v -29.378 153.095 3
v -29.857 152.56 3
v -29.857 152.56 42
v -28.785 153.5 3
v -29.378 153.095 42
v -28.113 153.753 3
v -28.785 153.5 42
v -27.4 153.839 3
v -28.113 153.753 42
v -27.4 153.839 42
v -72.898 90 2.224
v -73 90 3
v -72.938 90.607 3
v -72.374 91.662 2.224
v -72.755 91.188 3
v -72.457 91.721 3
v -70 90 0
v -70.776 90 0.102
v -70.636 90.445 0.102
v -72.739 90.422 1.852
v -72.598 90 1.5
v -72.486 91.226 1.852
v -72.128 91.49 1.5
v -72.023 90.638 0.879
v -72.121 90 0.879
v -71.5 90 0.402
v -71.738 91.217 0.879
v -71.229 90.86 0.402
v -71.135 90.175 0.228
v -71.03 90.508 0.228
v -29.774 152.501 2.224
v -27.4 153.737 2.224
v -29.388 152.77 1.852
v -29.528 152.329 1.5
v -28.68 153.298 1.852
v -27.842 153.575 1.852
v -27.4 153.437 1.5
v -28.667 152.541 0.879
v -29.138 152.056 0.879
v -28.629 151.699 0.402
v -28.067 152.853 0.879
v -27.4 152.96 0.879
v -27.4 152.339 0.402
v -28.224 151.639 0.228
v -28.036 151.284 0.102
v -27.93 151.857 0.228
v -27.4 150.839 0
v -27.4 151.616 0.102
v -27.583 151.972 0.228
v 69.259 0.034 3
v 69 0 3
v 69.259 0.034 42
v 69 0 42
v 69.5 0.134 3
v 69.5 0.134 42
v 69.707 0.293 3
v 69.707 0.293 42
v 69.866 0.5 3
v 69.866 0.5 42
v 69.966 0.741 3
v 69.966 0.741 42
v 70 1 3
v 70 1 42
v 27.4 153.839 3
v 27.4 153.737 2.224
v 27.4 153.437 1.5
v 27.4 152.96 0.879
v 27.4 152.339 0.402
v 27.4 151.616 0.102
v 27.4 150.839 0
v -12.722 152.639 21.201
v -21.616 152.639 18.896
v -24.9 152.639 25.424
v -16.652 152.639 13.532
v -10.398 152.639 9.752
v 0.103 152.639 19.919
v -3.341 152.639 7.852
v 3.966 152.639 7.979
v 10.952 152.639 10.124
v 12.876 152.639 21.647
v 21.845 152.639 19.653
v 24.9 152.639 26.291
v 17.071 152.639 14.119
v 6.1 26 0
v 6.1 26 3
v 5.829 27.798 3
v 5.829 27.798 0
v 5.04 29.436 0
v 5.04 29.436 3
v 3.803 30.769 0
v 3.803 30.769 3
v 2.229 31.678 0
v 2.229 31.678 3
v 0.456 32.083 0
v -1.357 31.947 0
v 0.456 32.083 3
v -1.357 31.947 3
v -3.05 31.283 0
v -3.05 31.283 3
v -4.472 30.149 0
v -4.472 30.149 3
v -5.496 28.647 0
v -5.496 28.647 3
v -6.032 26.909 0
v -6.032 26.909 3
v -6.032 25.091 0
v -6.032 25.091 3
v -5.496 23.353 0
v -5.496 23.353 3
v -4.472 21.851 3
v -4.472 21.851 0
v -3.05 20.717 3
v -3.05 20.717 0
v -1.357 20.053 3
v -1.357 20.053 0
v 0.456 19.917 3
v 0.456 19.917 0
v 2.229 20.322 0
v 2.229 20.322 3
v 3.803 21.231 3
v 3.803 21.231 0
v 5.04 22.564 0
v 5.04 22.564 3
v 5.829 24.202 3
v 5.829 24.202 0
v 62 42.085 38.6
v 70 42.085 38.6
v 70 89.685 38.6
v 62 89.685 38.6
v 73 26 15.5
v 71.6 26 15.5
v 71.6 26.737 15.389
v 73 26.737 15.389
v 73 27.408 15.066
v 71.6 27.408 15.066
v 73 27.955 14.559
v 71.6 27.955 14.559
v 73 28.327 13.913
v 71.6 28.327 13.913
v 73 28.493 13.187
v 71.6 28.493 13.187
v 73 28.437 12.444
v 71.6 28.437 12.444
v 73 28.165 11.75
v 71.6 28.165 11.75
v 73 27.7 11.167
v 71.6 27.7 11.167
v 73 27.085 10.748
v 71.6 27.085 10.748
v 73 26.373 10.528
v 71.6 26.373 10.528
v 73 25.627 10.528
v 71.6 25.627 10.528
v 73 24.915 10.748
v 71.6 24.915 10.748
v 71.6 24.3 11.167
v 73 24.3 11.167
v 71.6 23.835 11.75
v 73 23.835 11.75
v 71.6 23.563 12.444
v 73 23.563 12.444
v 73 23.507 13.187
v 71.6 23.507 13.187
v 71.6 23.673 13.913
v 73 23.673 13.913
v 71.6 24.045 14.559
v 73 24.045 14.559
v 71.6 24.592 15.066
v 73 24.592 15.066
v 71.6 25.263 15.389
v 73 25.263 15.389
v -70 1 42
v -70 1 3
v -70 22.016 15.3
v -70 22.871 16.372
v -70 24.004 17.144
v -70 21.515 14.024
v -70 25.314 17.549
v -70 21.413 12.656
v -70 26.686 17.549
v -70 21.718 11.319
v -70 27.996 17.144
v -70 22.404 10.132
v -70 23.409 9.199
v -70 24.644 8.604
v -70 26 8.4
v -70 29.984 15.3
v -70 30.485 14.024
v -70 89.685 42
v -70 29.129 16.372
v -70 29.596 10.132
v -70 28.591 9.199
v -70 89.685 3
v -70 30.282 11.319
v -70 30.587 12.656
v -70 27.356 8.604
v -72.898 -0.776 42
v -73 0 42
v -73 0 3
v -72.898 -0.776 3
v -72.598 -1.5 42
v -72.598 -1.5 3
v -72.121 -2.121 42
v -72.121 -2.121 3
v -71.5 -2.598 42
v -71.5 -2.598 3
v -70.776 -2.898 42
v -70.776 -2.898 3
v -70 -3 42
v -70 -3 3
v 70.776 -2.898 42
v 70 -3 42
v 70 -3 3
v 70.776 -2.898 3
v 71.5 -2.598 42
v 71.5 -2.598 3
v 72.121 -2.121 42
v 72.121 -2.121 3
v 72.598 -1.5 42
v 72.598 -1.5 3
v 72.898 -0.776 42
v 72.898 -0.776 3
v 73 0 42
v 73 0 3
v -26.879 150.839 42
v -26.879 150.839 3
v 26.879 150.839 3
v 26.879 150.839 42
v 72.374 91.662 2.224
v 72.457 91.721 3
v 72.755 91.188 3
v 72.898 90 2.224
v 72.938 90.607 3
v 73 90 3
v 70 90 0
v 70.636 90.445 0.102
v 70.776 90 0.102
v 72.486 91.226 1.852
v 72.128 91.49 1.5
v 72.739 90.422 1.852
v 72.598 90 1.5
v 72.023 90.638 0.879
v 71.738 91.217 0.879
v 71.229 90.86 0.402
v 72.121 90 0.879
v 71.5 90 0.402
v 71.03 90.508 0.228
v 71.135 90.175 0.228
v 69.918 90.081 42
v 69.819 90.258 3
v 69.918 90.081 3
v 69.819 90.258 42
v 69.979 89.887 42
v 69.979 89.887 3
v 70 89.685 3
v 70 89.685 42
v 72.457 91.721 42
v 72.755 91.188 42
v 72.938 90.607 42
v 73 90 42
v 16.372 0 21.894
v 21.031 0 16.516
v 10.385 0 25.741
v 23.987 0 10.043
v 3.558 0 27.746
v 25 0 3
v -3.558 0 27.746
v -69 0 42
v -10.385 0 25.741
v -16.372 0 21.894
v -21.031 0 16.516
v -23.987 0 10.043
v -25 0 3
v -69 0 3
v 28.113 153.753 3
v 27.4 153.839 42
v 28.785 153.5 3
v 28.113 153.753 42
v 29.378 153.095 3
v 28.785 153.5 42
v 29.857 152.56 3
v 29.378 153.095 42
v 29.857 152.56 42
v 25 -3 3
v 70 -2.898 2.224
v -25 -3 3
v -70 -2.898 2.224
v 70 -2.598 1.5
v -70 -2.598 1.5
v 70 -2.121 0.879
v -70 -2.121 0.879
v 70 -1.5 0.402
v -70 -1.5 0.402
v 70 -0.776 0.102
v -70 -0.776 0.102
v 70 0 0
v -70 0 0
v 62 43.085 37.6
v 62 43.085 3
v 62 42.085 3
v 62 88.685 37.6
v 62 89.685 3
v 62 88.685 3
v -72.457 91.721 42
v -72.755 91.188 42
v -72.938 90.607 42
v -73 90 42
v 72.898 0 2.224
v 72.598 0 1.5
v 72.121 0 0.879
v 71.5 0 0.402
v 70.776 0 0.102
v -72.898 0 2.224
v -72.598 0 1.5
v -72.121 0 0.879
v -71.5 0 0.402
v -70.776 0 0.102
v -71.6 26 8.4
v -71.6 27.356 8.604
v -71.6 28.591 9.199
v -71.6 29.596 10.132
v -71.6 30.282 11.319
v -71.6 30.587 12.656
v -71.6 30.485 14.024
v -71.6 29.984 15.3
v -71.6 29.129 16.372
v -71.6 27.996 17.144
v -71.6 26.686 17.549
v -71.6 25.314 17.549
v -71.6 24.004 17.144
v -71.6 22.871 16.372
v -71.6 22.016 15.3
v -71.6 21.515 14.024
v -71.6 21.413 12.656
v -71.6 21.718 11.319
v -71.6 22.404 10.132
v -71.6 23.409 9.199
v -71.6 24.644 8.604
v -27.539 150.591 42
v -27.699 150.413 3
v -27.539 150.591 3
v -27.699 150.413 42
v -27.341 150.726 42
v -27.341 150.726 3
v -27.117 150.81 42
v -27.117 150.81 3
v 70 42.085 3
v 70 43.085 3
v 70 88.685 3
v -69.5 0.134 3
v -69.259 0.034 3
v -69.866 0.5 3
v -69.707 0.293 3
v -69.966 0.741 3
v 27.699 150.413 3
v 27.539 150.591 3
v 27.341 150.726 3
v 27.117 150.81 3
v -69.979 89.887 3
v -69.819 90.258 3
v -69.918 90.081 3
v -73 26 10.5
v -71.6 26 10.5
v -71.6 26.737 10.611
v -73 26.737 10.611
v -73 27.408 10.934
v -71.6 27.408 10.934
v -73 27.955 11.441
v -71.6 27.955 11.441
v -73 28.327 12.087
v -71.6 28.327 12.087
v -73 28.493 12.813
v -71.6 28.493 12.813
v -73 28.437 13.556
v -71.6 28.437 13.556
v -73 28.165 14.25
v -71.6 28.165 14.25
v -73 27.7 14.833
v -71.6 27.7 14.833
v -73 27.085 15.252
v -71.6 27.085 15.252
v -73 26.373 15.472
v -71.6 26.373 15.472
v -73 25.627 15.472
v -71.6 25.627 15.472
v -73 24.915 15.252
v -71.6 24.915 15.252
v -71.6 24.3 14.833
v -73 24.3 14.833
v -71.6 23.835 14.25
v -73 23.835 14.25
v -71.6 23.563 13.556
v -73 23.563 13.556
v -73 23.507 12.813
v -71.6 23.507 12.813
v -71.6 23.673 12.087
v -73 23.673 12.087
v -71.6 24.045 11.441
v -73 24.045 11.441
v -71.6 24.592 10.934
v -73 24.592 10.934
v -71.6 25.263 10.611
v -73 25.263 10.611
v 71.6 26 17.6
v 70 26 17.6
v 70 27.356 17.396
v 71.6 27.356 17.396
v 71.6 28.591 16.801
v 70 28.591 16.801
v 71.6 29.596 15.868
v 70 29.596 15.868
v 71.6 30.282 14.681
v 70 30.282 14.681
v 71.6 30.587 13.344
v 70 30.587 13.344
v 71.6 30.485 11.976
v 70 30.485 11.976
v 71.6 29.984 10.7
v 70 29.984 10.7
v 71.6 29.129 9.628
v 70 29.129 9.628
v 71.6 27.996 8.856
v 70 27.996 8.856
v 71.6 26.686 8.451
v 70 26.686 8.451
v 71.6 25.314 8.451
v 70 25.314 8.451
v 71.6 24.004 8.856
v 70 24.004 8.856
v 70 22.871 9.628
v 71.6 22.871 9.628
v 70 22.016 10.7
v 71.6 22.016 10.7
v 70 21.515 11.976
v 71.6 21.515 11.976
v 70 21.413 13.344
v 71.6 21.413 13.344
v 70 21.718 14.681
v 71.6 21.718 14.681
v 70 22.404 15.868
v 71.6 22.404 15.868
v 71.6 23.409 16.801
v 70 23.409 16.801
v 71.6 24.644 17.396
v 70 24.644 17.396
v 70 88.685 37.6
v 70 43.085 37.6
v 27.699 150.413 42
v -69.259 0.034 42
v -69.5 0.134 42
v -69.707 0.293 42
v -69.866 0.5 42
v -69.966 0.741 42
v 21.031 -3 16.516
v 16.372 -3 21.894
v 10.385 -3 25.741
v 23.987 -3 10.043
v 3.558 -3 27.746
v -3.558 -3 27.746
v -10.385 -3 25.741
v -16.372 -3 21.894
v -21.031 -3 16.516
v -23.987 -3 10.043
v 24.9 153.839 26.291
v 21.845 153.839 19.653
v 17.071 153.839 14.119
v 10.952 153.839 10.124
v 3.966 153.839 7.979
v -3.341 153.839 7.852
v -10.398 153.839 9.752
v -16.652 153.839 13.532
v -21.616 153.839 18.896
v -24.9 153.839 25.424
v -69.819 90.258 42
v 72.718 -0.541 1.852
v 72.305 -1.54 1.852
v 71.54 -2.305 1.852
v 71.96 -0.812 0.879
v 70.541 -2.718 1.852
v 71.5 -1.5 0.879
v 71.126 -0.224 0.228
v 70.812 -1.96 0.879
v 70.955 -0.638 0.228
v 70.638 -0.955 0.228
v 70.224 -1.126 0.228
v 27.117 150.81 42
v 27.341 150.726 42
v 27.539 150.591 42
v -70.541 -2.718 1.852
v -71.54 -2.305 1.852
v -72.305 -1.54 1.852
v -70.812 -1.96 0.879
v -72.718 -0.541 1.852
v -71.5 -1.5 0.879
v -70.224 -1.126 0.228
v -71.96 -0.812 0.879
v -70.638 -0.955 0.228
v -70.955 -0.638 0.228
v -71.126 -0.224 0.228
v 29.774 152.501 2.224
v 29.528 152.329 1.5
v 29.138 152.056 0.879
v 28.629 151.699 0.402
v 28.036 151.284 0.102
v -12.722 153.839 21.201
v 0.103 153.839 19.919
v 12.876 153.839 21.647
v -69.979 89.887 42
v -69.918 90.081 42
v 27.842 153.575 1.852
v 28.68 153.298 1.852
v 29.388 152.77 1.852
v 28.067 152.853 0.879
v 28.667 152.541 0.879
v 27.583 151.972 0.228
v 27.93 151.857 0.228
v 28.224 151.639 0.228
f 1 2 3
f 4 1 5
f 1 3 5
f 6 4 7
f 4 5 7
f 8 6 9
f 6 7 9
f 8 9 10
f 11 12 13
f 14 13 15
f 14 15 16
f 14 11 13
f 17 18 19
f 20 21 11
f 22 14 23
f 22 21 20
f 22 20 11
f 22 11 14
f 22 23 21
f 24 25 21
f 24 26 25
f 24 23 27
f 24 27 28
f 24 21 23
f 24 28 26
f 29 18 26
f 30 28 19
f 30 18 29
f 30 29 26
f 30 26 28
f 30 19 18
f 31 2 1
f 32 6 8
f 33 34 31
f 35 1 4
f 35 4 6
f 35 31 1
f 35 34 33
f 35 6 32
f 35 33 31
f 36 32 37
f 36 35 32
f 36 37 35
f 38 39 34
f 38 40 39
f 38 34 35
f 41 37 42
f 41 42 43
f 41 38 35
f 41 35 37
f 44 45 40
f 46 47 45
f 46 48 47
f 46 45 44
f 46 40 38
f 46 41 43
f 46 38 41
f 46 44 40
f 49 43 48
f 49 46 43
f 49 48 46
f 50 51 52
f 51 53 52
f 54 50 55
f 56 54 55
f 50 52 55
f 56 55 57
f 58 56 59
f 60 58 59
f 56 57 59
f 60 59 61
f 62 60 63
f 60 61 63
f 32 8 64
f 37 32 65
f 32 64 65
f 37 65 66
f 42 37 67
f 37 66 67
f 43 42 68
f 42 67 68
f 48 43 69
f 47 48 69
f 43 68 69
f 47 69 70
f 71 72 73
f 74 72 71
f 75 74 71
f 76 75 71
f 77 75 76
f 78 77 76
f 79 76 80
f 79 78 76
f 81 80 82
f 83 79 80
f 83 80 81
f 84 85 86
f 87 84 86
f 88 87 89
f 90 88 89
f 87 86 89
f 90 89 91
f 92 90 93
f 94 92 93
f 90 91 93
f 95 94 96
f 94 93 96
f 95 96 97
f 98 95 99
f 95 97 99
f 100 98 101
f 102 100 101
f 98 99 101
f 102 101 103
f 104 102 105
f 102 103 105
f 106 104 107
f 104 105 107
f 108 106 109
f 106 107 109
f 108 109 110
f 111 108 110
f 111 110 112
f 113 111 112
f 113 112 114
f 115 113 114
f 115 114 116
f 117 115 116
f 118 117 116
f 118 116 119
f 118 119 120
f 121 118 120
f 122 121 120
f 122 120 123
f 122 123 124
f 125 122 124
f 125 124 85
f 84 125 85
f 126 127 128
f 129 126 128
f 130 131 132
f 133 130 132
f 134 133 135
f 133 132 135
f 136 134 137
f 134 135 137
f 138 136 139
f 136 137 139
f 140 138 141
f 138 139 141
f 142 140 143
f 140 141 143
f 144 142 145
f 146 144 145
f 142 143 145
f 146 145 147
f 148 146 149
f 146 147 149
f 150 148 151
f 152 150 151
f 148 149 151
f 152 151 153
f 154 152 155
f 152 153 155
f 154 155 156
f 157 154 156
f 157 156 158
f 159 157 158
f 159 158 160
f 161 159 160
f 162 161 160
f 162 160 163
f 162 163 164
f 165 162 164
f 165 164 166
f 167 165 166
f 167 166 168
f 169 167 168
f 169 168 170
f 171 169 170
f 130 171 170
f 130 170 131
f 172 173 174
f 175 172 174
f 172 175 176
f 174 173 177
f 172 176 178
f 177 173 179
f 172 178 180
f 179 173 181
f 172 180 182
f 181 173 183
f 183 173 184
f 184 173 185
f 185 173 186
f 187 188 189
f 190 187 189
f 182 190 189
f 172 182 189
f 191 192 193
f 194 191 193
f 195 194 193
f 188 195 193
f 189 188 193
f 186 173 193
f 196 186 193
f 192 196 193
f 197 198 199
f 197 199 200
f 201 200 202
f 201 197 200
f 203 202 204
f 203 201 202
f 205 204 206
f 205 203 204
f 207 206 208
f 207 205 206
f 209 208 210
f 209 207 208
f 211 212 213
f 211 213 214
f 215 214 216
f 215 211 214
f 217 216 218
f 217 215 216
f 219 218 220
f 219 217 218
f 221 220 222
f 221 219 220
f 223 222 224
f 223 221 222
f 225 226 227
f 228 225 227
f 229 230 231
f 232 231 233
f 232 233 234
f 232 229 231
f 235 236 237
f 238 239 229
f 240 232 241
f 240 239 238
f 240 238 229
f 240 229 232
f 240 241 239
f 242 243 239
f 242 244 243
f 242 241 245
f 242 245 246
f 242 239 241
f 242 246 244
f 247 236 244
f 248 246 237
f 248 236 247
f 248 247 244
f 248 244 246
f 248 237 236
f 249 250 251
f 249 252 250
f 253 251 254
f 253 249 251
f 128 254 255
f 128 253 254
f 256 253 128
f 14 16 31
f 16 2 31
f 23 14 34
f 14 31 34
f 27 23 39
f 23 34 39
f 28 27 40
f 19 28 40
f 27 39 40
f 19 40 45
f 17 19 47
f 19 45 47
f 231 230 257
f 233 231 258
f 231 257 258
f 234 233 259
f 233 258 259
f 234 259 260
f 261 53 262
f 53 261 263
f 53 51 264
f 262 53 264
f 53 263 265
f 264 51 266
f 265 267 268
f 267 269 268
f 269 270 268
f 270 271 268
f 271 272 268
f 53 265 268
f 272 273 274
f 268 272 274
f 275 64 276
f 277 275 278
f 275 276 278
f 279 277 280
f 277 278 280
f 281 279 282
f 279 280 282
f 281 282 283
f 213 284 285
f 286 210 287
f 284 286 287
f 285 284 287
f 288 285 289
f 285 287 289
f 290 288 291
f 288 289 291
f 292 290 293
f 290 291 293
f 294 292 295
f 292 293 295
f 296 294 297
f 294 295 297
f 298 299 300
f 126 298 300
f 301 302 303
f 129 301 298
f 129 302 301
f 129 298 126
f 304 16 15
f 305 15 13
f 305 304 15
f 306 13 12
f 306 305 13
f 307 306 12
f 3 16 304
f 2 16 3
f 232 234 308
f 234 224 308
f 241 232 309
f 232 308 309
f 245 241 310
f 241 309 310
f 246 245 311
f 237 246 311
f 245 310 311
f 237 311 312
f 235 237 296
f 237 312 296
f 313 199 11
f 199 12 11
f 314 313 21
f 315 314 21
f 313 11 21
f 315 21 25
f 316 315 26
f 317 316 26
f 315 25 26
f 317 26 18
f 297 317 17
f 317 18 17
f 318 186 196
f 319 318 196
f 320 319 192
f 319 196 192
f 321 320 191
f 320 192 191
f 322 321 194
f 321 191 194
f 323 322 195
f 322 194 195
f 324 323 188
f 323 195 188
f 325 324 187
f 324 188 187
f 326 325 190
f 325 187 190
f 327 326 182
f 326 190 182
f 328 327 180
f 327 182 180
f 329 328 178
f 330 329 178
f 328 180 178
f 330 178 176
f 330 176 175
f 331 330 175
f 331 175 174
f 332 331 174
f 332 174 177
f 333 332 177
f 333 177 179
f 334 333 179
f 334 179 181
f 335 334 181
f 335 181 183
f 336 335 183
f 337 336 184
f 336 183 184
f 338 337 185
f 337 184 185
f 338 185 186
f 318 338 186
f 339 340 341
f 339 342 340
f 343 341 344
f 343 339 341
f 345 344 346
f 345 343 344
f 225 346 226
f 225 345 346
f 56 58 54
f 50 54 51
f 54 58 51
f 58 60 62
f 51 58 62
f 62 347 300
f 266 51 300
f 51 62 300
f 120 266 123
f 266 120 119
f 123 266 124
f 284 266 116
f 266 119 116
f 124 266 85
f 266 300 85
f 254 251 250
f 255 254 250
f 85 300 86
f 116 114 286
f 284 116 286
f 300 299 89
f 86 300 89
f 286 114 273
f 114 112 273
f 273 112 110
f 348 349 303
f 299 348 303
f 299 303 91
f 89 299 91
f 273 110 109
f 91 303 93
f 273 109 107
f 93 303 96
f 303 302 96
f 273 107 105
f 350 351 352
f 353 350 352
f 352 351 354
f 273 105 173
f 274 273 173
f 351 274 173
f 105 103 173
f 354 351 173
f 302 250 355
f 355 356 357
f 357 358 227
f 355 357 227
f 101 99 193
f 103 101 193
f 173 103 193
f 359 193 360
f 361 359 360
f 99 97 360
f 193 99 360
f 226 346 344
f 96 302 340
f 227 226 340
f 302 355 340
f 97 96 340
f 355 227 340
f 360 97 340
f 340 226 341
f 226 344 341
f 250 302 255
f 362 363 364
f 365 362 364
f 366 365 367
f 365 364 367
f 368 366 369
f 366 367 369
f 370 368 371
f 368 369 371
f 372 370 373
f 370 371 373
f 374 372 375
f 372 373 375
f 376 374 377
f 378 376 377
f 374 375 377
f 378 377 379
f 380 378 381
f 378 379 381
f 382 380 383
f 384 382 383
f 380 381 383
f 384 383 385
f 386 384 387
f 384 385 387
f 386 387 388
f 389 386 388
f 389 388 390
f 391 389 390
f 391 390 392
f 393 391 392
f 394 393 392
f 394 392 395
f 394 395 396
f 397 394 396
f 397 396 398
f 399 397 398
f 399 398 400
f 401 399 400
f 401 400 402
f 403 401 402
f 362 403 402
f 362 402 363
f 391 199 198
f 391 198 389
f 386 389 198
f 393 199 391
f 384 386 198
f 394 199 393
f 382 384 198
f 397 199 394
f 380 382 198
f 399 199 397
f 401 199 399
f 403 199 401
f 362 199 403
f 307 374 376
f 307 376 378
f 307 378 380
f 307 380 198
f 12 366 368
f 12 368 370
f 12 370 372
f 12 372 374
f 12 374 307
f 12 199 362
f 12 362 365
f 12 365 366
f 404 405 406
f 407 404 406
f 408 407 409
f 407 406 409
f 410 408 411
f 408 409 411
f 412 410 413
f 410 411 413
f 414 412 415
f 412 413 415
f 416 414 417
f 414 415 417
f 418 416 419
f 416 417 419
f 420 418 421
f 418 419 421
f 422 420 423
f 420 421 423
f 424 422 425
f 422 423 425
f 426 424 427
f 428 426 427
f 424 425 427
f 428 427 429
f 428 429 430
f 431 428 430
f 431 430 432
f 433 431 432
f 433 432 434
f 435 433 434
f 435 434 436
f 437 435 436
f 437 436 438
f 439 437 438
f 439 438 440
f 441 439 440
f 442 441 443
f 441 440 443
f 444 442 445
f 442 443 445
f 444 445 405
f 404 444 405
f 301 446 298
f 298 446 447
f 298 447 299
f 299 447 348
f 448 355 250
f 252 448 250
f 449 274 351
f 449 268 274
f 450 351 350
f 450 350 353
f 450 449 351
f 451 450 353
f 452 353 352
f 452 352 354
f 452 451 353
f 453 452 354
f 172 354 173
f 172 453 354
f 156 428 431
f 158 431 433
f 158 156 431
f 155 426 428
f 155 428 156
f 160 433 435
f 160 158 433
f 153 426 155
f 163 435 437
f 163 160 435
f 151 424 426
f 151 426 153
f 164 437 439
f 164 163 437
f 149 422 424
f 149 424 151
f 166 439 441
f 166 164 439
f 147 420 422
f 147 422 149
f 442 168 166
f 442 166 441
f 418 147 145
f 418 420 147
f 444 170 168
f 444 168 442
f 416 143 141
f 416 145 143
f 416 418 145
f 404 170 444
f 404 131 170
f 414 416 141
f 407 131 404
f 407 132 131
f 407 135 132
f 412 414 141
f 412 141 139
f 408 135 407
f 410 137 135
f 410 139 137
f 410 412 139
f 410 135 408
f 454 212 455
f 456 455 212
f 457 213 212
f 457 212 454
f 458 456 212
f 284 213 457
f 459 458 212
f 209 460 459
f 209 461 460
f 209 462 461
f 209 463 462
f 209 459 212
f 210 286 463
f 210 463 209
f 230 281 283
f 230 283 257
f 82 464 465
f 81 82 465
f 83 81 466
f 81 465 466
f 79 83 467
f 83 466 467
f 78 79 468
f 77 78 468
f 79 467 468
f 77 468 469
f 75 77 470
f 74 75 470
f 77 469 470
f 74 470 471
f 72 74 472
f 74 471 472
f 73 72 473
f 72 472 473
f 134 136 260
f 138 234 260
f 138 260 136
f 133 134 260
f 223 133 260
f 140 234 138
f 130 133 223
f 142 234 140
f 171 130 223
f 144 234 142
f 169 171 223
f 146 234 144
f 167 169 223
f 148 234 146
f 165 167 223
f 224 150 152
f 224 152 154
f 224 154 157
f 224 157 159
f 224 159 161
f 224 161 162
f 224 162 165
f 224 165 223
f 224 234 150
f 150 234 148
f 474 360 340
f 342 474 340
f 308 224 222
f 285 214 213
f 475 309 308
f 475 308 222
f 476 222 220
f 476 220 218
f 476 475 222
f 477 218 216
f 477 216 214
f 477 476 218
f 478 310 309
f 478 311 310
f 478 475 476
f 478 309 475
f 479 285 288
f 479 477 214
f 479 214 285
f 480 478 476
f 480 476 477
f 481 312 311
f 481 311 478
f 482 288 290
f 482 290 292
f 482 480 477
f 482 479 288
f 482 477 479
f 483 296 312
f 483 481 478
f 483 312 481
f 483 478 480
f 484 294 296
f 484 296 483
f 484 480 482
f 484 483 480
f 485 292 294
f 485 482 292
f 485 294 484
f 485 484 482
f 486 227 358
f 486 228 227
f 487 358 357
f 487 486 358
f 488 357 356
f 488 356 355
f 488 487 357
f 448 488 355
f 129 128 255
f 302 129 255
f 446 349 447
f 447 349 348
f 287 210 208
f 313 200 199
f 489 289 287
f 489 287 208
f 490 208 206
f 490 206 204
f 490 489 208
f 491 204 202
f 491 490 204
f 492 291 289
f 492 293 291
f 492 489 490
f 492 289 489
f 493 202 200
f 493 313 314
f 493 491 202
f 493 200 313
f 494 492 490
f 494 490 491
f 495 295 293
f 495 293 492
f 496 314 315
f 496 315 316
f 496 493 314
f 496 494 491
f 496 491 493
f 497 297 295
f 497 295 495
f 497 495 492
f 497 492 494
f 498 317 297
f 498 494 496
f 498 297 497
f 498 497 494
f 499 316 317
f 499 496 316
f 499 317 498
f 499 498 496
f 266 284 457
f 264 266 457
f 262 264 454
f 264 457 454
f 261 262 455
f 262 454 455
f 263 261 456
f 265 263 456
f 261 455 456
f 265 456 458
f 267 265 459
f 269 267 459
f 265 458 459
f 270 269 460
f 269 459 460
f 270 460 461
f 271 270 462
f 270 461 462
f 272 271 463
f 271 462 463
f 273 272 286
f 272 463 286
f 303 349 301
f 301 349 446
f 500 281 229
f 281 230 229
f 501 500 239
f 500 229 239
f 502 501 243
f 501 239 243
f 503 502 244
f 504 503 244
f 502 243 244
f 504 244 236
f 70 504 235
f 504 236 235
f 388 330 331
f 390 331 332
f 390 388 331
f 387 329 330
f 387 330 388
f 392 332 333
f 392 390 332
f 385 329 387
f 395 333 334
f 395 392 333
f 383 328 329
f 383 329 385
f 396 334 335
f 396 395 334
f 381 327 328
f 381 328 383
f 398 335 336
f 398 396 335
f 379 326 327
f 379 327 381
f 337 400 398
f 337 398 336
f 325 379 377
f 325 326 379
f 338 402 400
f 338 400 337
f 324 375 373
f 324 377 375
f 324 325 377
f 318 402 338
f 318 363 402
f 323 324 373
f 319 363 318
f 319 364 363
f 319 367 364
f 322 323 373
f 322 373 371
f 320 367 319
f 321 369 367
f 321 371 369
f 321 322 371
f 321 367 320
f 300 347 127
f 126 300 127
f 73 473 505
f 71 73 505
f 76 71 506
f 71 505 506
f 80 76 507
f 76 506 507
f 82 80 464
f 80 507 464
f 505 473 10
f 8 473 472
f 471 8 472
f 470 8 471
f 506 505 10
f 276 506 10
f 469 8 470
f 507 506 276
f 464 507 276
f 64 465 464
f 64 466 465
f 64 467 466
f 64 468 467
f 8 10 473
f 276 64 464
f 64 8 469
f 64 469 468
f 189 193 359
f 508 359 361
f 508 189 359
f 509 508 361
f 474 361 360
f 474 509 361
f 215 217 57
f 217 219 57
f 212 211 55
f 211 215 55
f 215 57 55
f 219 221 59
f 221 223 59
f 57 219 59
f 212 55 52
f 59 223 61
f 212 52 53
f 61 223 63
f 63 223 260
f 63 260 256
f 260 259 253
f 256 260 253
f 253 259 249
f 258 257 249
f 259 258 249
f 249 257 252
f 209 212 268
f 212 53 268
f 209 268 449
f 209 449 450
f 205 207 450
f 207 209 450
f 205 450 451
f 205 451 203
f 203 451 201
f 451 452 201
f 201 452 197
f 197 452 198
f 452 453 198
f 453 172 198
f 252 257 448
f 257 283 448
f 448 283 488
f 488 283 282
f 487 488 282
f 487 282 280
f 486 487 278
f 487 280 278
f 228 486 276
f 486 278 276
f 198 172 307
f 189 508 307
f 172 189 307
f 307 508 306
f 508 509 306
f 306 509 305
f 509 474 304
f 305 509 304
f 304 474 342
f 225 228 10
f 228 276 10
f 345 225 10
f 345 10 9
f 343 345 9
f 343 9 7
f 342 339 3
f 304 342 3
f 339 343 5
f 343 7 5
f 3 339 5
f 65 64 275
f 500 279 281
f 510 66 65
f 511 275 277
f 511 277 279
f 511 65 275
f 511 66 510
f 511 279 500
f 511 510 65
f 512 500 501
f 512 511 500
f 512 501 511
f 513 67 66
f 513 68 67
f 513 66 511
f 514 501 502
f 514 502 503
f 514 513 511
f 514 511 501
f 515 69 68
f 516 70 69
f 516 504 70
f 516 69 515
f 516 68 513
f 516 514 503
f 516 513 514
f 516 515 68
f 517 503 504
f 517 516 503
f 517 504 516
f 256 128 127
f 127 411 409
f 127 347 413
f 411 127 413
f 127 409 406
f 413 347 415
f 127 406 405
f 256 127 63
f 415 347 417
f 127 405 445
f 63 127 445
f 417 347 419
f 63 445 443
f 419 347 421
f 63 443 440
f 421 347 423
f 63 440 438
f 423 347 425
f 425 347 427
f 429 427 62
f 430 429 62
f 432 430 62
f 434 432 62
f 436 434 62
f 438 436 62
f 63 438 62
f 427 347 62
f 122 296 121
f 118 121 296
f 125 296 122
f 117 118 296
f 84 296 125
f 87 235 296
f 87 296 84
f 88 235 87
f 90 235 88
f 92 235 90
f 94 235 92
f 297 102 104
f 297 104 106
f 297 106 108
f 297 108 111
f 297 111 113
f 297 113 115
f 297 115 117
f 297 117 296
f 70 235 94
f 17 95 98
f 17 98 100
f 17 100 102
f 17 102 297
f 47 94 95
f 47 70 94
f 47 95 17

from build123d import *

# Parameters (mm, degrees)
BOSS_EXTRU_2_DEPTH       = 42
BOSS_EXTRU_3_DEPTH       = 3
CONG_5_R                 = 1
CONG_6_R                 = 3
CONG_7_R                 = 3
ESQUISSE4_R              = 4.6
ENL_V_MAT_EXTRU_1_DEPTH  = 1.6
ESQUISSE5_R              = 2.5
ENL_V_MAT_EXTRU_2_DEPTH  = 4
ESQUISSE6_R              = 4.6
ENL_V_MAT_EXTRU_3_DEPTH  = 1.6
ESQUISSE7_R              = 2.5
ENL_V_MAT_EXTRU_4_DEPTH  = 4
ENL_V_MAT_EXTRU_8_DEPTH  = 1.2
BOSS_EXTRU_4_DEPTH       = 8
ESQUISSE14_R             = 6.1
ENL_V_MAT_EXTRU_9_DEPTH  = 4
ENL_V_MAT_EXTRU_11_DEPTH = 3


with BuildPart() as part:
    # Esquisse1 → Boss.-Extru.2 (new body)
    with BuildSketch(Plane.XY):
        Polygon((-73, 90.945896367), (-28.961701152, 153.839105087), (28.961701152, 153.839105087), (73, 90.945896367), (73, -3), (-73, -3), align=None)
        Polygon((70, 0), (-70, 0), (-70, 90), (-27.4, 150.839105087), (27.4, 150.839105087), (70, 90), align=None, mode=Mode.SUBTRACT)
    extrude(amount=BOSS_EXTRU_2_DEPTH)

    # Esquisse3 → Boss.-Extru.3 (add)
    with BuildSketch(Plane.XY):
        Polygon((-70, 90), (-27.4, 150.839105087), (27.4, 150.839105087), (70, 90), (70, 0), (-70, 0), align=None)
    extrude(amount=BOSS_EXTRU_3_DEPTH)

    # Congé5
    cong_5_edges = [part.edges().sort_by_distance(p)[0] for p in [
        (70, 0, 22.5),
        (70, 90, 22.5),
        (27.4, 150.839105087, 22.5),
        (-27.4, 150.839105087, 22.5),
        (-70, 90, 22.5),
        (-70, 0, 22.5),
    ]]
    fillet(cong_5_edges, radius=CONG_5_R)

    # Congé6
    cong_6_edges = [part.edges().sort_by_distance(p)[0] for p in [
        (-73, -3, 21),
        (73, -3, 21),
        (73, 90.945896367, 21),
        (28.961701152, 153.839105087, 21),
        (-28.961701152, 153.839105087, 21),
        (-73, 90.945896367, 21),
    ]]
    fillet(cong_6_edges, radius=CONG_6_R)

    # Congé7
    cong_7_edges = [part.edges().sort_by_distance(p)[0] for p in [
        (-51.157456133, 122.140281853, 0),
        (51.157456133, 122.140281853, 0),
        (73, 45, 0),
        (0, -3, 0),
        (-28.78524584, 153.500137587, 0),
        (-72.861150852, 90.902117399, 0),
        (-72.121320344, -2.121320344, 0),
        (72.121320344, -2.121320344, 0),
        (72.861150852, 90.902117399, 0),
        (28.78524584, 153.500137587, 0),
        (0, 153.839105087, 0),
        (-73, 45, 0),
    ]]
    fillet(cong_7_edges, radius=CONG_7_R)

    # Esquisse4 → Enlèv. mat.-Extru.1 (cut)
    with BuildSketch(Plane(origin=(-70, 0, 0), x_dir=(0, 0, -1), z_dir=(1, 0, 0))):
        with Locations((-13, 26)):
            Circle(ESQUISSE4_R)
    extrude(amount=-ENL_V_MAT_EXTRU_1_DEPTH, mode=Mode.SUBTRACT)

    # Esquisse5 → Enlèv. mat.-Extru.2 (cut, through all)
    with BuildSketch(Plane(origin=(-70, 0, 0), x_dir=(0, 0, -1), z_dir=(1, 0, 0))):
        with Locations((-13, 26)):
            Circle(ESQUISSE5_R)
    extrude(amount=-ENL_V_MAT_EXTRU_2_DEPTH, mode=Mode.SUBTRACT)

    # Esquisse6 → Enlèv. mat.-Extru.3 (cut)
    with BuildSketch(Plane.ZY.offset(-70)):
        with Locations((13, 26)):
            Circle(ESQUISSE6_R)
    extrude(amount=-ENL_V_MAT_EXTRU_3_DEPTH, mode=Mode.SUBTRACT)

    # Esquisse7 → Enlèv. mat.-Extru.4 (cut, through all)
    with BuildSketch(Plane.ZY.offset(-70)):
        with Locations((13, 26)):
            Circle(ESQUISSE7_R)
    extrude(amount=-ENL_V_MAT_EXTRU_4_DEPTH, mode=Mode.SUBTRACT)

    # Esquisse12 → Enlèv. mat.-Extru.8 (cut)
    with BuildSketch(Plane(origin=(0, 153.839105087, 0), x_dir=(1, 0, 0), z_dir=(0, 1, 0))):
        with BuildLine():
            ThreePointArc((24.9, -26.291388692), (0.316807272, -7.658549634), (-24.9, -25.424491407))
            ThreePointArc((-24.9, -25.424491407), (0.10338435, -19.918896621), (24.9, -26.291388692))
        make_face()
    extrude(amount=-ENL_V_MAT_EXTRU_8_DEPTH, mode=Mode.SUBTRACT)

    # Esquisse13 → Boss.-Extru.4 (add)
    with BuildSketch(Plane.ZY.offset(-70)):
        Polygon((3, 89.684701211), (3, 88.684701211), (37.6, 88.684701211), (37.6, 43.084701211), (3, 43.084701211), (3, 42.084701211), (38.6, 42.084701211), (38.6, 89.684701211), align=None)
    extrude(amount=BOSS_EXTRU_4_DEPTH)

    # Esquisse14 → Enlèv. mat.-Extru.9 (cut, through all)
    with BuildSketch(Plane.XY.offset(3)):
        with Locations((0, 26)):
            Circle(ESQUISSE14_R)
    extrude(amount=-ENL_V_MAT_EXTRU_9_DEPTH, mode=Mode.SUBTRACT)

    # Esquisse16 → Enlèv. mat.-Extru.11 (cut)
    with BuildSketch(Plane.XZ.offset(3)):
        with BuildLine():
            Line((-25, 3), (25, 3))
            ThreePointArc((25, 3), (0, 28), (-25, 3))
        make_face()
    extrude(amount=-ENL_V_MAT_EXTRU_11_DEPTH, mode=Mode.SUBTRACT)


solid = part.part
